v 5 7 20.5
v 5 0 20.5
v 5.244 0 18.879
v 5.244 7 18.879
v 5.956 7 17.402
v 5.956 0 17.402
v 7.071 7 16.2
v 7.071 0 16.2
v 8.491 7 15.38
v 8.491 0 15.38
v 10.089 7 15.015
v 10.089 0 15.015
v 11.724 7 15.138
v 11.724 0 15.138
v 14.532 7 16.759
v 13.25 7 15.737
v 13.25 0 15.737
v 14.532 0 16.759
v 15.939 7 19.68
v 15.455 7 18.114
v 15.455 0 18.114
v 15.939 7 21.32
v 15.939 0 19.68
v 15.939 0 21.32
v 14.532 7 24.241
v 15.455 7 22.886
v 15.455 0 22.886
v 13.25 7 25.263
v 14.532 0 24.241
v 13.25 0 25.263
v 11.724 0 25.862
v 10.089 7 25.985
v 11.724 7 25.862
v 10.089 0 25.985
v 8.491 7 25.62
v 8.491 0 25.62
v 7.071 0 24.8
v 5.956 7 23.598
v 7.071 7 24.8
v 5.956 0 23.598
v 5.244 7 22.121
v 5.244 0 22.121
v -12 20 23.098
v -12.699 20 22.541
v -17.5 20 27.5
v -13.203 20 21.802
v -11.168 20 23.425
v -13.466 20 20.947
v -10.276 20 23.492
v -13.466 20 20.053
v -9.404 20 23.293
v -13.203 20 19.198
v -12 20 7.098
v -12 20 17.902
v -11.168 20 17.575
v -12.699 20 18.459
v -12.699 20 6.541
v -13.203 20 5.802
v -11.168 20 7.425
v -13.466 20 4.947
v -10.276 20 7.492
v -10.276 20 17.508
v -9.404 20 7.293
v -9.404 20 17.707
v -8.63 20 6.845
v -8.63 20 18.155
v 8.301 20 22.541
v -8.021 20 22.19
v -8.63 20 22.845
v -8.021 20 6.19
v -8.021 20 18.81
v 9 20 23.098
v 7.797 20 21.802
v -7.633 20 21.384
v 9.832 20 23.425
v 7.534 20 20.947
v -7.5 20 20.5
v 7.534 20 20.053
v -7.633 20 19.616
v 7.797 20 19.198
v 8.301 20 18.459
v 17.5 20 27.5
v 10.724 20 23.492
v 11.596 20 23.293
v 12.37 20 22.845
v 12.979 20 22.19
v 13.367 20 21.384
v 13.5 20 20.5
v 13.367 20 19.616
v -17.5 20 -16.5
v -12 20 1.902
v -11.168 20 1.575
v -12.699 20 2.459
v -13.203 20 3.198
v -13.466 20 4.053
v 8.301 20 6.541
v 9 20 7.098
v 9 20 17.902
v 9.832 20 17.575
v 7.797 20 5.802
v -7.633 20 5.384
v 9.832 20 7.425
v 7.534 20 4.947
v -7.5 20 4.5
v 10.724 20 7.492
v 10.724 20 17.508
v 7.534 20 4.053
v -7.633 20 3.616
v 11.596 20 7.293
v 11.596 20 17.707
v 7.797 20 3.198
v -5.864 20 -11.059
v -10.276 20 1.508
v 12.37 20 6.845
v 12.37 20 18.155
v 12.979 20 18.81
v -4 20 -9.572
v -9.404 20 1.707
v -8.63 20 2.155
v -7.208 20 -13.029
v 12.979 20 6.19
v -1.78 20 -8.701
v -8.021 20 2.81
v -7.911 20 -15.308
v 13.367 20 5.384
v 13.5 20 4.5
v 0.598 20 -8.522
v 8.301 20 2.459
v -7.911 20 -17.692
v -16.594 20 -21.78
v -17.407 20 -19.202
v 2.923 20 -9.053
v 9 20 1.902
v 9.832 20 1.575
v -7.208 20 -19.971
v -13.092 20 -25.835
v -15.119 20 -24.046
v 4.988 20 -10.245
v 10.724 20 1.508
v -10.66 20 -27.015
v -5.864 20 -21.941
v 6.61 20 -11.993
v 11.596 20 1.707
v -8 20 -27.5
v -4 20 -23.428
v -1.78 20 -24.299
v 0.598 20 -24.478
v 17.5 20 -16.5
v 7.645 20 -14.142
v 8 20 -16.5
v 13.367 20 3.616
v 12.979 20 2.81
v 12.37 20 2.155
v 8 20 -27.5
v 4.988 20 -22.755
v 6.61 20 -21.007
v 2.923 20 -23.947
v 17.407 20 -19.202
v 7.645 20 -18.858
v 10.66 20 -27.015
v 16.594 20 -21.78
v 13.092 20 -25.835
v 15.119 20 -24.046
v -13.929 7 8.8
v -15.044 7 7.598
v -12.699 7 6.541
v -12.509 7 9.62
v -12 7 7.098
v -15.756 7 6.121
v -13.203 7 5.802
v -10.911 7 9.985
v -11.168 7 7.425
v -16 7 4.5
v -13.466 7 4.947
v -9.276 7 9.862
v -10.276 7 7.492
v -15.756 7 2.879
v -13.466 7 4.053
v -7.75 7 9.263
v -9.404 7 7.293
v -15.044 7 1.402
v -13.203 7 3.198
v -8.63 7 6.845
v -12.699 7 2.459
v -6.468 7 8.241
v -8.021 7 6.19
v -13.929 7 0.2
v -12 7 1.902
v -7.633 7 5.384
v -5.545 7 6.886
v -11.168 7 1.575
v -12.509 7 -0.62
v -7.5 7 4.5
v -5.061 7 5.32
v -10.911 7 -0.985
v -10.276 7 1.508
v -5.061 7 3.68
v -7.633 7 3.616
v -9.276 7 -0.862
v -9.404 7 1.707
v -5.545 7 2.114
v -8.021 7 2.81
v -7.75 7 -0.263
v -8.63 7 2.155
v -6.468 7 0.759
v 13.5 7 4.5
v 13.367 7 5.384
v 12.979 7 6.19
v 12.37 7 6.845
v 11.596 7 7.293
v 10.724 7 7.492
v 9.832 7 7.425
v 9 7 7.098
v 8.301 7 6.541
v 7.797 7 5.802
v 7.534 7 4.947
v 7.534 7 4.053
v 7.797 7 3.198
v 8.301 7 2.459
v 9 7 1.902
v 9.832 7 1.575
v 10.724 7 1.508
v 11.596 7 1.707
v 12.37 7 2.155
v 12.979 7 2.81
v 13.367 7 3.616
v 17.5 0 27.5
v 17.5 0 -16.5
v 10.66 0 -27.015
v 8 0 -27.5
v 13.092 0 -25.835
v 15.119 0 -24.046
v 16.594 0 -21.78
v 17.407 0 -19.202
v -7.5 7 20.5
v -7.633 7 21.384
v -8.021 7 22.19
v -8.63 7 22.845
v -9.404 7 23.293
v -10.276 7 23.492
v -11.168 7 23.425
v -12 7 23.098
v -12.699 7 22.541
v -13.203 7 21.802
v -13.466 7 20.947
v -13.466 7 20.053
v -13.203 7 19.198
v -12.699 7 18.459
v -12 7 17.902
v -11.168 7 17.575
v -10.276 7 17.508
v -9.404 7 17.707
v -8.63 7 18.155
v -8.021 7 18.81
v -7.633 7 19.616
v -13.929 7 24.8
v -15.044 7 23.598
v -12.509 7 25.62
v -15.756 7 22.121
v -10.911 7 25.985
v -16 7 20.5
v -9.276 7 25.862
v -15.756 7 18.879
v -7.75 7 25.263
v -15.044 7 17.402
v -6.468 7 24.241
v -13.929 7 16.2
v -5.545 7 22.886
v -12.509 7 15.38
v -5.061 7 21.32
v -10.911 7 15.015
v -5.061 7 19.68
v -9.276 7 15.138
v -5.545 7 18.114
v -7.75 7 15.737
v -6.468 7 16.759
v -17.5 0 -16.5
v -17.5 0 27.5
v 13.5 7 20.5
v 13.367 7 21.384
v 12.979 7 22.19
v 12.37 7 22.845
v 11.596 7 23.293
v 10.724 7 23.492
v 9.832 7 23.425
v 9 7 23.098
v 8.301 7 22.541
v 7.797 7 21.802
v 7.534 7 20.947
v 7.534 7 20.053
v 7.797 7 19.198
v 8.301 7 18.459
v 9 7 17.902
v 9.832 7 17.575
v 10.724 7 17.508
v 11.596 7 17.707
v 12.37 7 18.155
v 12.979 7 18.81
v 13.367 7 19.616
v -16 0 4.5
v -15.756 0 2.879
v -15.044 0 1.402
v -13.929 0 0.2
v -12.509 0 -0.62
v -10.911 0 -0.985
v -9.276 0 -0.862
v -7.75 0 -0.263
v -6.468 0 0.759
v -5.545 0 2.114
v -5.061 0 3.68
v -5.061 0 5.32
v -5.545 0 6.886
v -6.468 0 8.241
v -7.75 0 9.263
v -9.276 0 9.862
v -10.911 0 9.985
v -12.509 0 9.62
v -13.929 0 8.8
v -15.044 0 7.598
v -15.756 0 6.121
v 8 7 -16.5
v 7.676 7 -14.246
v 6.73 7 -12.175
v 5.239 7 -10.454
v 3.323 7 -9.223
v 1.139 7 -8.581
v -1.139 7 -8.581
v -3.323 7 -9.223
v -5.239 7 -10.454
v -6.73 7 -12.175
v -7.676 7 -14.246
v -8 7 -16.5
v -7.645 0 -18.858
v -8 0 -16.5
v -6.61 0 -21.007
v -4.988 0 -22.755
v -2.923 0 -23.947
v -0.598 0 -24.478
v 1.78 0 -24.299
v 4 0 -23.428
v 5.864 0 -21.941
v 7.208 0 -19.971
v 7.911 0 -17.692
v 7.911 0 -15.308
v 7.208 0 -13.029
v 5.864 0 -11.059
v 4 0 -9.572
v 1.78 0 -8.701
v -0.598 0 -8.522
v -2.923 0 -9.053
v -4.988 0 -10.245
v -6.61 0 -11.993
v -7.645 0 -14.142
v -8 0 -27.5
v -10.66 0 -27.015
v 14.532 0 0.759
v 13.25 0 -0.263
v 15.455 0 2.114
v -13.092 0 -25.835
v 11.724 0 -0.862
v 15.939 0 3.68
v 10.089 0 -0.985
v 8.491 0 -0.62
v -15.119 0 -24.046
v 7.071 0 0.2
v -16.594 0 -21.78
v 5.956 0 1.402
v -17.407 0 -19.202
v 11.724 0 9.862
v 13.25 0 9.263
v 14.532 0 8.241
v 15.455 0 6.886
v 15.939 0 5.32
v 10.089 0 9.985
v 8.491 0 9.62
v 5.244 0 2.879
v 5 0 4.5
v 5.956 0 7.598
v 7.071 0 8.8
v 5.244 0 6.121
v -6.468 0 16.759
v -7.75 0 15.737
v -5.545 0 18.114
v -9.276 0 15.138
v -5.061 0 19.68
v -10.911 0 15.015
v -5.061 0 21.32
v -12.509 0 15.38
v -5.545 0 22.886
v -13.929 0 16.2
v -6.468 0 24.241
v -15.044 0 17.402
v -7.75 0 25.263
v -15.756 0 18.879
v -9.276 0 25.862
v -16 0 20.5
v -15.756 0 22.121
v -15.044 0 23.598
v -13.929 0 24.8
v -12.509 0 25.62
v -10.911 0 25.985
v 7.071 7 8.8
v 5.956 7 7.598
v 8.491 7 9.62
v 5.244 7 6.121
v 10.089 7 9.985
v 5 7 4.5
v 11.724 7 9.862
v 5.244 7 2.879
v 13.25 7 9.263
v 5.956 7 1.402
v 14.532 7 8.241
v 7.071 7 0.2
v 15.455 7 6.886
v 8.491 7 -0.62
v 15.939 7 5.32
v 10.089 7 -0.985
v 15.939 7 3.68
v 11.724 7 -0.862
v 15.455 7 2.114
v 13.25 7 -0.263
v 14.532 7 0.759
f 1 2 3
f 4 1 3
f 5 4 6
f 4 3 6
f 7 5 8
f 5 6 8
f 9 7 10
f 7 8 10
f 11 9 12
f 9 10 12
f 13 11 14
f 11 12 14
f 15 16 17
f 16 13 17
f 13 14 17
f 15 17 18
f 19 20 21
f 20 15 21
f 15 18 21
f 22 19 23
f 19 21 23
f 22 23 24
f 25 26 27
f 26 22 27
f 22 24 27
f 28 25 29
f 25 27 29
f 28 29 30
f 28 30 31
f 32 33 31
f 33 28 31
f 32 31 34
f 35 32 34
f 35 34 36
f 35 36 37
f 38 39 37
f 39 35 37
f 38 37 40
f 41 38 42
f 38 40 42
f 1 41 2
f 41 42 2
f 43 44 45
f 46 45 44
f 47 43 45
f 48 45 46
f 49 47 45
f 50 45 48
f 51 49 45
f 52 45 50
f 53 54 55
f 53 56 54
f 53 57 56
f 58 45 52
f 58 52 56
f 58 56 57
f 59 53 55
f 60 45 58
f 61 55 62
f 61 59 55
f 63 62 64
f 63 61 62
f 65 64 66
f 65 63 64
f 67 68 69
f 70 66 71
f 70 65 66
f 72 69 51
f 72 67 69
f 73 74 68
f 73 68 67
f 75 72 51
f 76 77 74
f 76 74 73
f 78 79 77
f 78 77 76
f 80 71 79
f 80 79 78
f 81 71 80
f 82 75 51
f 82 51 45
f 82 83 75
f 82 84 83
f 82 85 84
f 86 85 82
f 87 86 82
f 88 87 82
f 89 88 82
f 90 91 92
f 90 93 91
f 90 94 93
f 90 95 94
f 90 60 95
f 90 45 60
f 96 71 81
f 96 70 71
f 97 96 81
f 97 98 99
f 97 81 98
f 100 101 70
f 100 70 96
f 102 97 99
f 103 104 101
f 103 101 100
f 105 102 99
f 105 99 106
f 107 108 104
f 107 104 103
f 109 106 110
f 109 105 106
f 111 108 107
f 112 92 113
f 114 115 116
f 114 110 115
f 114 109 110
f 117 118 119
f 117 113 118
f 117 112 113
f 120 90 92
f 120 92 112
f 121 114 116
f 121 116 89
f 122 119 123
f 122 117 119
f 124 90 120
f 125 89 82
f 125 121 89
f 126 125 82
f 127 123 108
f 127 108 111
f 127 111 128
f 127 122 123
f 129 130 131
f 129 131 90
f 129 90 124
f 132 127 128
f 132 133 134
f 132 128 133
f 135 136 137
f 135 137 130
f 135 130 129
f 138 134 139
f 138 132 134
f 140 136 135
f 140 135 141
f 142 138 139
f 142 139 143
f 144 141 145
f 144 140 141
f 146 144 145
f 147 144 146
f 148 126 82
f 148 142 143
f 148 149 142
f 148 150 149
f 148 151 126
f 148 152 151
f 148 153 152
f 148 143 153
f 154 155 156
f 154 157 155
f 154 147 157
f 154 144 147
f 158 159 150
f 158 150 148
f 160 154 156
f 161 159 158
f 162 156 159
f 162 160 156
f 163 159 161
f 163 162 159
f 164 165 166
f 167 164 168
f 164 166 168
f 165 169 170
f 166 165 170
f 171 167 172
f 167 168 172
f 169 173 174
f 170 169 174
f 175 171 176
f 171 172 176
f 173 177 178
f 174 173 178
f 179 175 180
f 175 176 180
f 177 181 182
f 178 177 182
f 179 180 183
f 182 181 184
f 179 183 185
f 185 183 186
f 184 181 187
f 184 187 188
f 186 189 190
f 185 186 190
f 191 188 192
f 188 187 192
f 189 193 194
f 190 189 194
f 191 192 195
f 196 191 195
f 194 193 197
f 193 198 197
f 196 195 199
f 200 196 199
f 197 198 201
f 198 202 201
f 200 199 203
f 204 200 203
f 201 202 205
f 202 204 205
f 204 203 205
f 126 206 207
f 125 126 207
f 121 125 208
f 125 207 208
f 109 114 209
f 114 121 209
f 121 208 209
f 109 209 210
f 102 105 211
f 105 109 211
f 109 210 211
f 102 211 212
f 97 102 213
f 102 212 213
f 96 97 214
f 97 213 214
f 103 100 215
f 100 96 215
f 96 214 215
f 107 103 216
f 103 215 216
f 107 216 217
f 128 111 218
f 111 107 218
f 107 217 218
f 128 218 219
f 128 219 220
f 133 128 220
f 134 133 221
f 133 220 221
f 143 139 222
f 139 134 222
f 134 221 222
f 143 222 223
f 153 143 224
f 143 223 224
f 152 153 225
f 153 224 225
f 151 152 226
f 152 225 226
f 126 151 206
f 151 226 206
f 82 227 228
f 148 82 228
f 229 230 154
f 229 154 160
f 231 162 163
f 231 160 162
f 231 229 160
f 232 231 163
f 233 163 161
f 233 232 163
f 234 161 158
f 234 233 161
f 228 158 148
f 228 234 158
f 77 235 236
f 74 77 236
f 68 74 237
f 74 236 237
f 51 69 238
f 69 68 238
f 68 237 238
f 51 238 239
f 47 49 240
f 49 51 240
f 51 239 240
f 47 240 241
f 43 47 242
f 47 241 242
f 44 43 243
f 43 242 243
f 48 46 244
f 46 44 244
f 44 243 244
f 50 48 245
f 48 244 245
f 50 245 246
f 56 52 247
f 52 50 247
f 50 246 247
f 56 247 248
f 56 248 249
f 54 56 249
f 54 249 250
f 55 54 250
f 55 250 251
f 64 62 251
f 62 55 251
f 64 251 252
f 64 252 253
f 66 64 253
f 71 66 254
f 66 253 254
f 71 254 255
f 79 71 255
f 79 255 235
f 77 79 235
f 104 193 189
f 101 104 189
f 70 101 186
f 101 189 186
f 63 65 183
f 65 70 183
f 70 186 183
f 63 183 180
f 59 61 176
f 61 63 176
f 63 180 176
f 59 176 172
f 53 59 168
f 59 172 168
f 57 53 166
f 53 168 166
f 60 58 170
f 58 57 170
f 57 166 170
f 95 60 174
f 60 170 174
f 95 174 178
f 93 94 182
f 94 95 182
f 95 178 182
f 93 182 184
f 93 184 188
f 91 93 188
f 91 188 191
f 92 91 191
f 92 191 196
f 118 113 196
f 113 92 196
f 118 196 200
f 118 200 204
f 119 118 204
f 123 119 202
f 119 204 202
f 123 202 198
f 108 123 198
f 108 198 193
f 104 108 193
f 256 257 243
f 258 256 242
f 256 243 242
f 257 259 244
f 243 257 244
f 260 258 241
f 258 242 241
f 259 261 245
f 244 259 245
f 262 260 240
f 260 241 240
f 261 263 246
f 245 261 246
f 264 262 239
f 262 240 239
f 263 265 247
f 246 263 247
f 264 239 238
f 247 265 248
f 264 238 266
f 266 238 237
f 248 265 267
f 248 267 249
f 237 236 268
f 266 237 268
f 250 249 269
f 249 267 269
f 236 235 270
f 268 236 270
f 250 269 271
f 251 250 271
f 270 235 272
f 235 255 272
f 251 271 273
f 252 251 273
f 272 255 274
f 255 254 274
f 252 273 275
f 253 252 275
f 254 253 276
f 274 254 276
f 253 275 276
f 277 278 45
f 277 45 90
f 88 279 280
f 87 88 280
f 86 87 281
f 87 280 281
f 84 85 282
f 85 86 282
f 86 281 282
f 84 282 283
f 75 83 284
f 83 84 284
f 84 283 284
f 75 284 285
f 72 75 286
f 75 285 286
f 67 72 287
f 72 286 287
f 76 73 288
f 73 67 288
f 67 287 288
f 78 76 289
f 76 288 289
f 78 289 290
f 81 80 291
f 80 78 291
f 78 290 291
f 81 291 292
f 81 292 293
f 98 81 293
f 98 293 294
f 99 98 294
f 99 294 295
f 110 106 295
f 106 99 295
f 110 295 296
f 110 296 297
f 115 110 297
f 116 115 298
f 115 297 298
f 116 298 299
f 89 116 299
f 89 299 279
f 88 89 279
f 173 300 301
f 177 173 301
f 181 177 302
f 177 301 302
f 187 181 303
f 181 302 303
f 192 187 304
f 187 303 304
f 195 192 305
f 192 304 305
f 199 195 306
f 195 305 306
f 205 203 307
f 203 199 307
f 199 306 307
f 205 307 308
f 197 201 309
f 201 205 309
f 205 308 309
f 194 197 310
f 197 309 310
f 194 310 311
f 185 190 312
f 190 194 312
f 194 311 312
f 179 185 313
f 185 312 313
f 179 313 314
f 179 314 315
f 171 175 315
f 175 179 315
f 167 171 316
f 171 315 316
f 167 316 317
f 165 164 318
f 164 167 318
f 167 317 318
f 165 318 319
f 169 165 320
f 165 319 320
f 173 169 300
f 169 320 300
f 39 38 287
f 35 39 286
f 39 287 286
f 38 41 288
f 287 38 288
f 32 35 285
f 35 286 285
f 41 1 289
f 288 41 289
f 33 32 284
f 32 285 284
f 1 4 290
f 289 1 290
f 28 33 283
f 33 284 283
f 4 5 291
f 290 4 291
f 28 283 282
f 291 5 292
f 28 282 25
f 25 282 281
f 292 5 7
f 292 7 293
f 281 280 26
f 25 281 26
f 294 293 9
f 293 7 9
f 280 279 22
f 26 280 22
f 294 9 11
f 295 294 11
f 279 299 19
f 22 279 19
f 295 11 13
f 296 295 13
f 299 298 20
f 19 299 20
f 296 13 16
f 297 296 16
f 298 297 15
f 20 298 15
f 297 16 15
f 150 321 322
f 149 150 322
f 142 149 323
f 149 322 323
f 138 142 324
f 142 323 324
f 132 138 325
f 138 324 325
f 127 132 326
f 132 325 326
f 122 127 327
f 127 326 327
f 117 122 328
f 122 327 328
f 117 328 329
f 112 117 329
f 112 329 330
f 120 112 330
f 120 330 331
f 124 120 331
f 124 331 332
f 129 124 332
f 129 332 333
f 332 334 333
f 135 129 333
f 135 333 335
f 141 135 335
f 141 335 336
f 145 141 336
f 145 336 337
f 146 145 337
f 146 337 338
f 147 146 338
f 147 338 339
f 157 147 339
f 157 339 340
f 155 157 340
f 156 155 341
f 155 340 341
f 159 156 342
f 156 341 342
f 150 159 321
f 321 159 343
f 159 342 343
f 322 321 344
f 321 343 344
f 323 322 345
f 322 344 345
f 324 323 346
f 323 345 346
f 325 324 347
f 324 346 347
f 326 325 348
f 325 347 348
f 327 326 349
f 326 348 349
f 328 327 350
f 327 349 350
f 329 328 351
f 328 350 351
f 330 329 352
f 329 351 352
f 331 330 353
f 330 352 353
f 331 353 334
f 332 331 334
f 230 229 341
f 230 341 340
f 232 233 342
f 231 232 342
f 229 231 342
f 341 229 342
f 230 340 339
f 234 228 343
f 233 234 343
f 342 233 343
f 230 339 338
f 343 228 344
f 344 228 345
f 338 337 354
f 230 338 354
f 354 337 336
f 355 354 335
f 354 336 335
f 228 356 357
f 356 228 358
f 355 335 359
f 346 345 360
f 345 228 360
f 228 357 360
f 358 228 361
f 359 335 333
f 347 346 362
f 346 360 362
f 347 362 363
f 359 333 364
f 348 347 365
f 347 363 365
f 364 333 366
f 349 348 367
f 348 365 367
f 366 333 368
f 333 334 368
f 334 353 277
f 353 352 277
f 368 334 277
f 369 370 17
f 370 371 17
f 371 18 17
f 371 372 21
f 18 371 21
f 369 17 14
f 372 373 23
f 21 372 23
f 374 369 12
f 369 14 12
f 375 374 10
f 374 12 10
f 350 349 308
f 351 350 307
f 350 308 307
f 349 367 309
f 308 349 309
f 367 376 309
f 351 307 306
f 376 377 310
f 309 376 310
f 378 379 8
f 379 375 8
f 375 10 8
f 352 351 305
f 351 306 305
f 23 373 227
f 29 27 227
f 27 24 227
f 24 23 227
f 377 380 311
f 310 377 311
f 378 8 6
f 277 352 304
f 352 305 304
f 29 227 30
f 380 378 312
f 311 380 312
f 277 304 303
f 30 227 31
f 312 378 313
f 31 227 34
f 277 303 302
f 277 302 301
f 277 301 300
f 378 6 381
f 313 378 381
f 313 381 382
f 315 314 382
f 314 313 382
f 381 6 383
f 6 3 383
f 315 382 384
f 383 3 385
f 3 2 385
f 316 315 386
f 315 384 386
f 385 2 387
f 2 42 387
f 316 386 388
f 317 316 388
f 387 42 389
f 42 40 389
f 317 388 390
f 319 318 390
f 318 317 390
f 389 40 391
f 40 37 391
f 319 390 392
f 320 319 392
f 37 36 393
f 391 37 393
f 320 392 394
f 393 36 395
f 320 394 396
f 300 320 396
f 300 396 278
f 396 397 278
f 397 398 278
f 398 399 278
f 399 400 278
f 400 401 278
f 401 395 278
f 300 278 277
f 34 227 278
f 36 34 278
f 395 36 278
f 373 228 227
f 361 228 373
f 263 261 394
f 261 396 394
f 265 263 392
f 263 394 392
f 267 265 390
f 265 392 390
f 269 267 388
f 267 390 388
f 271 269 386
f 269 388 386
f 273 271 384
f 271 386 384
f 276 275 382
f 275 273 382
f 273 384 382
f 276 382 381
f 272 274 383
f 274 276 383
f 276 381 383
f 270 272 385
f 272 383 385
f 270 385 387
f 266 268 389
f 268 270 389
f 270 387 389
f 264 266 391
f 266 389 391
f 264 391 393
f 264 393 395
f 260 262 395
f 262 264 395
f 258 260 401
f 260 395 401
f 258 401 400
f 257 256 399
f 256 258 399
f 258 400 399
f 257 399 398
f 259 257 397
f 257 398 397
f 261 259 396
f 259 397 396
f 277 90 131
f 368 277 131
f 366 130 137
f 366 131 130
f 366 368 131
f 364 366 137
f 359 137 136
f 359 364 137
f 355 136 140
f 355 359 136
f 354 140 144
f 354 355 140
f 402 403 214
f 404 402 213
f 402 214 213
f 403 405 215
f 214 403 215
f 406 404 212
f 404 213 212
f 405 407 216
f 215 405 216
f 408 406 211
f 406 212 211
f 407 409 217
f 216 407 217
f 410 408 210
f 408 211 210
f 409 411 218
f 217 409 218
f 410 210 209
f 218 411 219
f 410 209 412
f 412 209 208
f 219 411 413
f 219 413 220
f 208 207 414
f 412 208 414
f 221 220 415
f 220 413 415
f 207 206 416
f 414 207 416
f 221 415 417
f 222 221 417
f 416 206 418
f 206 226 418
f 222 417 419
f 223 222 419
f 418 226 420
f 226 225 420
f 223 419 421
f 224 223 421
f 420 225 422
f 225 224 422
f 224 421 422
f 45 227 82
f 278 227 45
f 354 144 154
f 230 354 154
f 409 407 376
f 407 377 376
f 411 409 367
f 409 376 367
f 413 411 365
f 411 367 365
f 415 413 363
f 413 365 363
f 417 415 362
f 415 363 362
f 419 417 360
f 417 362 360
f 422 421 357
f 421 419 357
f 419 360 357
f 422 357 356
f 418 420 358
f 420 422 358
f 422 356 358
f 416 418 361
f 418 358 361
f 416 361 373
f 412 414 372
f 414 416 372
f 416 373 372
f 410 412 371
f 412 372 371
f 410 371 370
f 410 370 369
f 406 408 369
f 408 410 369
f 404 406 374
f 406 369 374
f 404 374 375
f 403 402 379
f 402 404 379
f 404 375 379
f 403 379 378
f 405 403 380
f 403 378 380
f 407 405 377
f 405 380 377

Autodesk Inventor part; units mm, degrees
ref_plane "YZ Plane" through (0, 0, 0) normal (1, 0, 0) x (0, 1, 0)
ref_plane "XZ Plane" through (0, 0, 0) normal (0, 1, 0) x (-1, 0, 0)
ref_plane "XY Plane" through (0, 0, 0) normal (0, 0, 1) x (1, 0, 0)
sketch "Sketch1" plane through (0, 0, 0) normal (0, 1, 0) x (-1, 0, 0)
  line L0 (-17.5, 27.5) -> (17.5, 27.5)
  line L1 (-17.5, 27.5) -> (17.5, -27.5) construction
  line L2 (17.5, 27.5) -> (-17.5, -27.5) construction
  circle A0 centre (10.5, 4.5) radius 5.5
  circle A1 centre (-10.5, 4.5) radius 5.5
  circle A2 centre (-10.5, 20.5) radius 5.5
  circle A3 centre (10.5, 20.5) radius 5.5
  line L3 (17.5, 27.5) -> (17.5, -16.5)
  line L4 (-17.5, 27.5) -> (-17.5, -16.5)
  circle A4 centre (0, -16.5) radius 8
  line L5 (8, -27.5) -> (-8, -27.5)
  arc A5 (8, -27.5) -> (17.5, -16.5) centre (7.5511, -17.5101) ccw
  arc A6 (-17.5, -16.5) -> (-8, -27.5) centre (-7.5511, -17.5101) ccw
  point P0 (0, 0)
  point P1 (0, 27.5)
  dimension "d0" = 35
  dimension "d1" = 55
  dimension "d5" = 11
  dimension "d7" = 11
  dimension "d9" = 11
  dimension "d11" = 11
  dimension "d13" = 7
  dimension "d15" = 23
  dimension "d16" = 21
  dimension "d17" = 10.5
  dimension "d18" = 44
  dimension "d19" = 16
  dimension "d20" = 44
  dimension "d25" = 10
  dimension "d26" = 10
extrude "Extrusion1" add sketch "Sketch1" along normal blind 7
sketch "Sketch2" plane through (0, 7, 0) normal (0, 1, 0) x (1, 0, 0)
  line L0 (-17.5, 16.5) -> (-17.5, -27.5) projected
  line L1 (-17.5, -27.5) -> (-17.5, 16.5)
  line L2 (8, 27.5) -> (-8, 27.5) projected
  line L3 (-8, 27.5) -> (8, 27.5)
  line L4 (17.5, -27.5) -> (17.5, 16.5) projected
  line L5 (17.5, 16.5) -> (17.5, -27.5)
  line L6 (-17.5, -27.5) -> (17.5, -27.5) projected
  line L7 (17.5, -27.5) -> (-17.5, -27.5)
  circle A0 centre (0, 16.5) radius 8
  circle A1 centre (-10.5, -4.5) radius 3
  circle A2 centre (10.5, -4.5) radius 3
  circle A3 centre (10.5, -20.5) radius 3
  circle A4 centre (-10.5, -20.5) radius 3
  arc A5 (-8, 27.5) -> (-17.5, 16.5) centre (-7.5511, 17.5101) ccw projected
  arc A6 (-8, 27.5) -> (-17.5, 16.5) centre (-7.5511, 17.5101) ccw
  arc A7 (17.5, 16.5) -> (8, 27.5) centre (7.5511, 17.5101) ccw
  point P0 (0, 0)
  point P1 (0, -27.5)
  dimension "d29" = 16
  dimension "d30" = 6
  dimension "d31" = 6
  dimension "d32" = 6
  dimension "d33" = 6
  dimension "d34" = 7
  dimension "d35" = 23
  dimension "d36" = 21
  dimension "d37" = 10.5
extrude "Extrusion2" add sketch "Sketch2" along normal blind 13
properties part number "spindel sockel" material "Steel"
